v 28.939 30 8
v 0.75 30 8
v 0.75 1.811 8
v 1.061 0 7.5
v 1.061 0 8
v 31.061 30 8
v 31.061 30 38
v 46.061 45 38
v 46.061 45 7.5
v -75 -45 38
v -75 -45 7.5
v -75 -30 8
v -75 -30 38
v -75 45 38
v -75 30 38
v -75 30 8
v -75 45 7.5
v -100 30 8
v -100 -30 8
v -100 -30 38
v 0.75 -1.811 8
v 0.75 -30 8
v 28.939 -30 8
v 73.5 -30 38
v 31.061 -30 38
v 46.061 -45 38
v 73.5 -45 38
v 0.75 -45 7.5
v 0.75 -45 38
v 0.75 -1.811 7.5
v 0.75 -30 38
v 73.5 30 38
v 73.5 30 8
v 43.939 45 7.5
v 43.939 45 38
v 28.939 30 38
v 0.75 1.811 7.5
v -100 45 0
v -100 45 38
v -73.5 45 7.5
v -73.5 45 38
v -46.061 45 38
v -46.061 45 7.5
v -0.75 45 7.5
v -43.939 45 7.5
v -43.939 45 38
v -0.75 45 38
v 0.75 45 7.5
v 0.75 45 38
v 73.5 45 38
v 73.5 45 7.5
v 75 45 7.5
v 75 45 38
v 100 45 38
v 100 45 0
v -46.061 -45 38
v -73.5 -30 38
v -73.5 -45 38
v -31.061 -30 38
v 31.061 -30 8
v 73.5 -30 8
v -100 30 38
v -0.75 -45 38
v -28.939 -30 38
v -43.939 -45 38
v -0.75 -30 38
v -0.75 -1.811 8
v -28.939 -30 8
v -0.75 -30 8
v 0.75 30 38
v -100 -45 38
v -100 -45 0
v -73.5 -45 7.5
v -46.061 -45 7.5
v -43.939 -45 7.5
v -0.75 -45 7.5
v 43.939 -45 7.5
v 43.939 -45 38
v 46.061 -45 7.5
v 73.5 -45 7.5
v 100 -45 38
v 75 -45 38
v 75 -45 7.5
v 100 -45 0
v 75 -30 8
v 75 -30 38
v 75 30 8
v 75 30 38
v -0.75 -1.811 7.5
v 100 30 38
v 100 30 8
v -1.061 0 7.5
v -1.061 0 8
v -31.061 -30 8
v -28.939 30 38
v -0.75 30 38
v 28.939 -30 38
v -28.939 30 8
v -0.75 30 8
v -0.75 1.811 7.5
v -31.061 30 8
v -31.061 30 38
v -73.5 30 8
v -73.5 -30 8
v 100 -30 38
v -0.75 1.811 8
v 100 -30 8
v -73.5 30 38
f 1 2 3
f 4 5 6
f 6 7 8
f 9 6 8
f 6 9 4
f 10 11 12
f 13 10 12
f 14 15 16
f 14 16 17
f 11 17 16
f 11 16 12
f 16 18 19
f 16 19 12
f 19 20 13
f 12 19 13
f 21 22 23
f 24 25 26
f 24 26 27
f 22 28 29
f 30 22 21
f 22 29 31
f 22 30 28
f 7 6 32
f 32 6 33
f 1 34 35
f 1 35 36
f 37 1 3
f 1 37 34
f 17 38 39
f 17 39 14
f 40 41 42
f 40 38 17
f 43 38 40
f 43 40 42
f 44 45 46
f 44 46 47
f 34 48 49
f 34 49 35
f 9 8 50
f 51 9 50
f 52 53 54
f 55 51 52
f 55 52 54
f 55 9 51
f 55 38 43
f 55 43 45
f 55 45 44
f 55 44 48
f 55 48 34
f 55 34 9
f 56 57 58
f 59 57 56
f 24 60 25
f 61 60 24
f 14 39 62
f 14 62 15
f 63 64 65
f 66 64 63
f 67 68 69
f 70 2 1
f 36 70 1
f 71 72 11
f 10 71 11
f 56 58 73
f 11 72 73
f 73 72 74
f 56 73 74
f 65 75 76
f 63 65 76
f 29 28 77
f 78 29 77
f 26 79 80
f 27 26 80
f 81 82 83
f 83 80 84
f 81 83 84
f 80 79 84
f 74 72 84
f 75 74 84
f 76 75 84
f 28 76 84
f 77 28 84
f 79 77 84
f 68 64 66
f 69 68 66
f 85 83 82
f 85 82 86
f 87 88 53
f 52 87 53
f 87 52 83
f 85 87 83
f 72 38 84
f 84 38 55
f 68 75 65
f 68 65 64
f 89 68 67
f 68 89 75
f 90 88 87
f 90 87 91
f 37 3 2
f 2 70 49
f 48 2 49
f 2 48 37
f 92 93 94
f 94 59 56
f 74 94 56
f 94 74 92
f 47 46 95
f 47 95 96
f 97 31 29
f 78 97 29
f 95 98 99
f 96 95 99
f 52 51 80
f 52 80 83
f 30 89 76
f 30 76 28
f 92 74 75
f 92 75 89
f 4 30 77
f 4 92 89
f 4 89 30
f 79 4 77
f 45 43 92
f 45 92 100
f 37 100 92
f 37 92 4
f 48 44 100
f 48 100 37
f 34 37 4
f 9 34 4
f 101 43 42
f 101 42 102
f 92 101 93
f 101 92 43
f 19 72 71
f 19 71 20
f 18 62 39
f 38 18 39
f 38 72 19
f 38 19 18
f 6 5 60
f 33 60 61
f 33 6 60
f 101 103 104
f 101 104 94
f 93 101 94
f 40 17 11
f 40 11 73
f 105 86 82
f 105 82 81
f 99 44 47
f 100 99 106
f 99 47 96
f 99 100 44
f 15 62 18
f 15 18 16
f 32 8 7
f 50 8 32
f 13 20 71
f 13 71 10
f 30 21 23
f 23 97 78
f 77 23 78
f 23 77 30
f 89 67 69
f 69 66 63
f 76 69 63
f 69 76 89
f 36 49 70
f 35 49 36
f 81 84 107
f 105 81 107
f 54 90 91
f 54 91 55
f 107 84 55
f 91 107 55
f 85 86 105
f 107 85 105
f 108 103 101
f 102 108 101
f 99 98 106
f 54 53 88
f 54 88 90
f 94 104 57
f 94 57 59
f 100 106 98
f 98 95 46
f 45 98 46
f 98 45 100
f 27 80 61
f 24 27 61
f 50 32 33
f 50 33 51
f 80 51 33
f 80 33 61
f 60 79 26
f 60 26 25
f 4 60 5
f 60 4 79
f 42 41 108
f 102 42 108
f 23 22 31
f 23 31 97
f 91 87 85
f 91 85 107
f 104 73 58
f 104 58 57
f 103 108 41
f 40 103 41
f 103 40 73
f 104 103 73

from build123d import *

# Parameters (mm, degrees)
F0_W     = 200
F0_H     = 90
F1_DEPTH = 8
F2_W     = 200
F2_H     = 15
F3_DEPTH = 30
F4_W     = 1.5
F4_H     = 126.118213
F4_H_2   = 132.641569
F5_DEPTH = 30.5


with BuildPart() as f1:
    # F0 (on Top) → F1 (new body)
    with BuildSketch(Plane.XY):
        Rectangle(F0_W, F0_H)
    extrude(amount=F1_DEPTH)

    # F2 (on face) → F3 (join)
    with BuildSketch(Plane.XY.offset(8)):
        with Locations((0, 37.5)):
            Rectangle(F2_W, F2_H)
        with Locations((0, -37.5)):
            Rectangle(F2_W, F2_H)
    extrude(amount=F3_DEPTH)

    # F4 (on face) → F5 (cut)
    with BuildSketch(Plane.XY.offset(38)):
        Polygon((0.75, 60), (-0.75, 60), (-0.75, 1.81066), (0, 1.06066), (0.75, 1.81066), align=None)
        Polygon((0, 1.06066), (-0.75, 1.81066), (-47.126677, 48.187338), (-48.187338, 47.126677), (-1.06066, 0), (-47.126677, -46.066017), (-46.066017, -47.126677), (-0.75, -1.81066), (0, -1.06066), (0.75, -1.81066), (57.87868, -58.93934), (58.93934, -57.87868), (1.06066, 0), (60, 58.93934), (58.93934, 60), (0.75, 1.81066), align=None)
        Polygon((0, -1.06066), (-0.75, -1.81066), (-0.75, -70), (0.75, -70), (0.75, -1.81066), align=None)
        with Locations((-74.25, -3.795997)):
            Rectangle(F4_W, F4_H)
        with Locations((74.25, -6.622784)):
            Rectangle(F4_W, F4_H_2)
    extrude(amount=-F5_DEPTH, mode=Mode.SUBTRACT)


solid = f1.part
